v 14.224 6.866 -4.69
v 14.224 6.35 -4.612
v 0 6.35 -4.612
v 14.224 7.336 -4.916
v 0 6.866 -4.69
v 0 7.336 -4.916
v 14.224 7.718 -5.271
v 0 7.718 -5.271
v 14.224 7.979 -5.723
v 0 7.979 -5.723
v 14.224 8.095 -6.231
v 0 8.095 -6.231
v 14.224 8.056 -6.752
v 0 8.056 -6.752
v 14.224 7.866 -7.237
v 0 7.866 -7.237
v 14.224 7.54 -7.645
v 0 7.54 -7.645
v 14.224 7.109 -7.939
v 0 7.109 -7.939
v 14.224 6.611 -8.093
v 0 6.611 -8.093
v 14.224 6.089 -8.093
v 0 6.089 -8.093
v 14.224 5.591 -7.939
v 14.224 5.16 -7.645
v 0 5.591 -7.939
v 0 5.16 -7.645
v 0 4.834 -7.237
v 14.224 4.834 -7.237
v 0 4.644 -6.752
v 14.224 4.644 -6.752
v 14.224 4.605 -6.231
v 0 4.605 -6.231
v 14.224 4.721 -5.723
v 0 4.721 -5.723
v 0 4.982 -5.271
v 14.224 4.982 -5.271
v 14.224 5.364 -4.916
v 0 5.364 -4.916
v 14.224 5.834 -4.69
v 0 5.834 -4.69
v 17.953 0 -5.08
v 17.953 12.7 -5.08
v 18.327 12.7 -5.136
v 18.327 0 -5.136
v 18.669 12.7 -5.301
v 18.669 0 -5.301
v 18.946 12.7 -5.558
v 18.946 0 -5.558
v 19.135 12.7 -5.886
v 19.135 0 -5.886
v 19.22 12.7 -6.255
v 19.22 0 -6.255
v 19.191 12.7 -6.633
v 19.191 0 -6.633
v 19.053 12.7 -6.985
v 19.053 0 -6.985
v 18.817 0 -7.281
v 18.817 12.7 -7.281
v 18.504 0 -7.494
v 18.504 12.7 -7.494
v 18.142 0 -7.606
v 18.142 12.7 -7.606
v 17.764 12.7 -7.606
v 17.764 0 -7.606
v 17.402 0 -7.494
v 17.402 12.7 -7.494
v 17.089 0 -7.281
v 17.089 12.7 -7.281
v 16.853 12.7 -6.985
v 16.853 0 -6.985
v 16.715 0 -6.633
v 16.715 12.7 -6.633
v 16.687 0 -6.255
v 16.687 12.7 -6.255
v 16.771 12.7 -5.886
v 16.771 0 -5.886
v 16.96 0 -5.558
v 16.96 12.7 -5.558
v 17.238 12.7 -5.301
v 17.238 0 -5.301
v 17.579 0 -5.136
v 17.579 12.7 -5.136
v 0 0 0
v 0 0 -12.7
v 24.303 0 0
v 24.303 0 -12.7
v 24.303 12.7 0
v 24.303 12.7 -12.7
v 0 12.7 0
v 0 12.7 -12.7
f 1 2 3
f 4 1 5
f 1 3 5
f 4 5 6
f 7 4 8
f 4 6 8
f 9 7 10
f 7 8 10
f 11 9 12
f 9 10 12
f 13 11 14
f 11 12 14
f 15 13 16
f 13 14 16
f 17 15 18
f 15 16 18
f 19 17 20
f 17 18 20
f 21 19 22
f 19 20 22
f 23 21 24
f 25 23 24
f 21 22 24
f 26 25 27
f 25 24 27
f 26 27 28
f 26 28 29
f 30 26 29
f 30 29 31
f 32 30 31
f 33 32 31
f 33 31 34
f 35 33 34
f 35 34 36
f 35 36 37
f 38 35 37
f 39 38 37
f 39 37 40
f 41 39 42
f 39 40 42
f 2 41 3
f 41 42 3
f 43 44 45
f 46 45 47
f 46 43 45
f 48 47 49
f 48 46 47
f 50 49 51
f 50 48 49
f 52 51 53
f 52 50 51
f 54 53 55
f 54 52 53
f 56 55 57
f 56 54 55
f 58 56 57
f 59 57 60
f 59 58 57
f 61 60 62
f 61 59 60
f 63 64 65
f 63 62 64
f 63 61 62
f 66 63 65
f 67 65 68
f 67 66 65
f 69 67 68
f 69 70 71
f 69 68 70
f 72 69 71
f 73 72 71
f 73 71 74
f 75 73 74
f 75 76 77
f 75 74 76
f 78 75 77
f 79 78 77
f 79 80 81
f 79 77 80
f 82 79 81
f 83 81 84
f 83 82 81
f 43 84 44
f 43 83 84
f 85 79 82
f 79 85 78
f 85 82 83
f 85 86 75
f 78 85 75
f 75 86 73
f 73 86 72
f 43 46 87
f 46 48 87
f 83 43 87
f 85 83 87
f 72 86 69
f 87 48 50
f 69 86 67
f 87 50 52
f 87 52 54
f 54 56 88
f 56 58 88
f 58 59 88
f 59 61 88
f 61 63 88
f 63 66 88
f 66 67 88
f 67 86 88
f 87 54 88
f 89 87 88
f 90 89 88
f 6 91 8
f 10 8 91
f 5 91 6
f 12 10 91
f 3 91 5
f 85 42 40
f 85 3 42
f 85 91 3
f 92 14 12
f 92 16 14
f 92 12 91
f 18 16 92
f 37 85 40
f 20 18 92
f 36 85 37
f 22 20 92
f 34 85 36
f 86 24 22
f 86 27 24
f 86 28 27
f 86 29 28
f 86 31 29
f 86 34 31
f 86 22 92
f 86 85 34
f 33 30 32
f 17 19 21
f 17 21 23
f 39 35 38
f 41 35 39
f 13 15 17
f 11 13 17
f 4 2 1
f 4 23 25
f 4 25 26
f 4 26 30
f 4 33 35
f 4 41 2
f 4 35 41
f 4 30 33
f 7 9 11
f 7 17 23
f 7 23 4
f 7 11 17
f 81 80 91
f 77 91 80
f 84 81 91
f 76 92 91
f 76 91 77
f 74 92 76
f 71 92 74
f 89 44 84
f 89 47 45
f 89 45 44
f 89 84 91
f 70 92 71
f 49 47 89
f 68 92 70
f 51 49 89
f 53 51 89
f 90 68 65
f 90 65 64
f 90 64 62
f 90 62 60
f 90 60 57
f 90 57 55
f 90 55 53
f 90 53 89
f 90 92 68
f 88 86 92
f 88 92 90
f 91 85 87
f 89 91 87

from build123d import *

# Parameters (mm, degrees)
SKETCH1_W           = 24.303155339
SKETCH1_H           = 12.7
BOSS_EXTRUDE1_DEPTH = 12.7
SKETCH2_R           = 1.75
CUT_EXTRUDE1_DEPTH  = 14.224
SKETCH3_R           = 1.27
CUT_EXTRUDE2_DEPTH  = 31.219585693


with BuildPart() as part:
    # Sketch1 → Boss-Extrude1 (new body)
    with BuildSketch(Plane(origin=(0, 0, 0), x_dir=(1, 0, 0), z_dir=(0, 1, 0))):
        with Locations((12.151577669, 6.35)):
            Rectangle(SKETCH1_W, SKETCH1_H)
    extrude(amount=BOSS_EXTRUDE1_DEPTH)

    # Sketch2 → Cut-Extrude1 (cut)
    with BuildSketch(Plane.ZY):
        with Locations((-6.362201195, 6.35)):
            Circle(SKETCH2_R)
    extrude(amount=-CUT_EXTRUDE1_DEPTH, mode=Mode.SUBTRACT)

    # Sketch3 → Cut-Extrude2 (cut, through all)
    with BuildSketch(Plane(origin=(0, 0, 0), x_dir=(1, 0, 0), z_dir=(0, 1, 0))):
        with Locations(Location((17.953155339, 6.35, 0), (0, 0, 270))):
            Circle(SKETCH3_R)
    extrude(amount=CUT_EXTRUDE2_DEPTH, mode=Mode.SUBTRACT)


solid = part.part
